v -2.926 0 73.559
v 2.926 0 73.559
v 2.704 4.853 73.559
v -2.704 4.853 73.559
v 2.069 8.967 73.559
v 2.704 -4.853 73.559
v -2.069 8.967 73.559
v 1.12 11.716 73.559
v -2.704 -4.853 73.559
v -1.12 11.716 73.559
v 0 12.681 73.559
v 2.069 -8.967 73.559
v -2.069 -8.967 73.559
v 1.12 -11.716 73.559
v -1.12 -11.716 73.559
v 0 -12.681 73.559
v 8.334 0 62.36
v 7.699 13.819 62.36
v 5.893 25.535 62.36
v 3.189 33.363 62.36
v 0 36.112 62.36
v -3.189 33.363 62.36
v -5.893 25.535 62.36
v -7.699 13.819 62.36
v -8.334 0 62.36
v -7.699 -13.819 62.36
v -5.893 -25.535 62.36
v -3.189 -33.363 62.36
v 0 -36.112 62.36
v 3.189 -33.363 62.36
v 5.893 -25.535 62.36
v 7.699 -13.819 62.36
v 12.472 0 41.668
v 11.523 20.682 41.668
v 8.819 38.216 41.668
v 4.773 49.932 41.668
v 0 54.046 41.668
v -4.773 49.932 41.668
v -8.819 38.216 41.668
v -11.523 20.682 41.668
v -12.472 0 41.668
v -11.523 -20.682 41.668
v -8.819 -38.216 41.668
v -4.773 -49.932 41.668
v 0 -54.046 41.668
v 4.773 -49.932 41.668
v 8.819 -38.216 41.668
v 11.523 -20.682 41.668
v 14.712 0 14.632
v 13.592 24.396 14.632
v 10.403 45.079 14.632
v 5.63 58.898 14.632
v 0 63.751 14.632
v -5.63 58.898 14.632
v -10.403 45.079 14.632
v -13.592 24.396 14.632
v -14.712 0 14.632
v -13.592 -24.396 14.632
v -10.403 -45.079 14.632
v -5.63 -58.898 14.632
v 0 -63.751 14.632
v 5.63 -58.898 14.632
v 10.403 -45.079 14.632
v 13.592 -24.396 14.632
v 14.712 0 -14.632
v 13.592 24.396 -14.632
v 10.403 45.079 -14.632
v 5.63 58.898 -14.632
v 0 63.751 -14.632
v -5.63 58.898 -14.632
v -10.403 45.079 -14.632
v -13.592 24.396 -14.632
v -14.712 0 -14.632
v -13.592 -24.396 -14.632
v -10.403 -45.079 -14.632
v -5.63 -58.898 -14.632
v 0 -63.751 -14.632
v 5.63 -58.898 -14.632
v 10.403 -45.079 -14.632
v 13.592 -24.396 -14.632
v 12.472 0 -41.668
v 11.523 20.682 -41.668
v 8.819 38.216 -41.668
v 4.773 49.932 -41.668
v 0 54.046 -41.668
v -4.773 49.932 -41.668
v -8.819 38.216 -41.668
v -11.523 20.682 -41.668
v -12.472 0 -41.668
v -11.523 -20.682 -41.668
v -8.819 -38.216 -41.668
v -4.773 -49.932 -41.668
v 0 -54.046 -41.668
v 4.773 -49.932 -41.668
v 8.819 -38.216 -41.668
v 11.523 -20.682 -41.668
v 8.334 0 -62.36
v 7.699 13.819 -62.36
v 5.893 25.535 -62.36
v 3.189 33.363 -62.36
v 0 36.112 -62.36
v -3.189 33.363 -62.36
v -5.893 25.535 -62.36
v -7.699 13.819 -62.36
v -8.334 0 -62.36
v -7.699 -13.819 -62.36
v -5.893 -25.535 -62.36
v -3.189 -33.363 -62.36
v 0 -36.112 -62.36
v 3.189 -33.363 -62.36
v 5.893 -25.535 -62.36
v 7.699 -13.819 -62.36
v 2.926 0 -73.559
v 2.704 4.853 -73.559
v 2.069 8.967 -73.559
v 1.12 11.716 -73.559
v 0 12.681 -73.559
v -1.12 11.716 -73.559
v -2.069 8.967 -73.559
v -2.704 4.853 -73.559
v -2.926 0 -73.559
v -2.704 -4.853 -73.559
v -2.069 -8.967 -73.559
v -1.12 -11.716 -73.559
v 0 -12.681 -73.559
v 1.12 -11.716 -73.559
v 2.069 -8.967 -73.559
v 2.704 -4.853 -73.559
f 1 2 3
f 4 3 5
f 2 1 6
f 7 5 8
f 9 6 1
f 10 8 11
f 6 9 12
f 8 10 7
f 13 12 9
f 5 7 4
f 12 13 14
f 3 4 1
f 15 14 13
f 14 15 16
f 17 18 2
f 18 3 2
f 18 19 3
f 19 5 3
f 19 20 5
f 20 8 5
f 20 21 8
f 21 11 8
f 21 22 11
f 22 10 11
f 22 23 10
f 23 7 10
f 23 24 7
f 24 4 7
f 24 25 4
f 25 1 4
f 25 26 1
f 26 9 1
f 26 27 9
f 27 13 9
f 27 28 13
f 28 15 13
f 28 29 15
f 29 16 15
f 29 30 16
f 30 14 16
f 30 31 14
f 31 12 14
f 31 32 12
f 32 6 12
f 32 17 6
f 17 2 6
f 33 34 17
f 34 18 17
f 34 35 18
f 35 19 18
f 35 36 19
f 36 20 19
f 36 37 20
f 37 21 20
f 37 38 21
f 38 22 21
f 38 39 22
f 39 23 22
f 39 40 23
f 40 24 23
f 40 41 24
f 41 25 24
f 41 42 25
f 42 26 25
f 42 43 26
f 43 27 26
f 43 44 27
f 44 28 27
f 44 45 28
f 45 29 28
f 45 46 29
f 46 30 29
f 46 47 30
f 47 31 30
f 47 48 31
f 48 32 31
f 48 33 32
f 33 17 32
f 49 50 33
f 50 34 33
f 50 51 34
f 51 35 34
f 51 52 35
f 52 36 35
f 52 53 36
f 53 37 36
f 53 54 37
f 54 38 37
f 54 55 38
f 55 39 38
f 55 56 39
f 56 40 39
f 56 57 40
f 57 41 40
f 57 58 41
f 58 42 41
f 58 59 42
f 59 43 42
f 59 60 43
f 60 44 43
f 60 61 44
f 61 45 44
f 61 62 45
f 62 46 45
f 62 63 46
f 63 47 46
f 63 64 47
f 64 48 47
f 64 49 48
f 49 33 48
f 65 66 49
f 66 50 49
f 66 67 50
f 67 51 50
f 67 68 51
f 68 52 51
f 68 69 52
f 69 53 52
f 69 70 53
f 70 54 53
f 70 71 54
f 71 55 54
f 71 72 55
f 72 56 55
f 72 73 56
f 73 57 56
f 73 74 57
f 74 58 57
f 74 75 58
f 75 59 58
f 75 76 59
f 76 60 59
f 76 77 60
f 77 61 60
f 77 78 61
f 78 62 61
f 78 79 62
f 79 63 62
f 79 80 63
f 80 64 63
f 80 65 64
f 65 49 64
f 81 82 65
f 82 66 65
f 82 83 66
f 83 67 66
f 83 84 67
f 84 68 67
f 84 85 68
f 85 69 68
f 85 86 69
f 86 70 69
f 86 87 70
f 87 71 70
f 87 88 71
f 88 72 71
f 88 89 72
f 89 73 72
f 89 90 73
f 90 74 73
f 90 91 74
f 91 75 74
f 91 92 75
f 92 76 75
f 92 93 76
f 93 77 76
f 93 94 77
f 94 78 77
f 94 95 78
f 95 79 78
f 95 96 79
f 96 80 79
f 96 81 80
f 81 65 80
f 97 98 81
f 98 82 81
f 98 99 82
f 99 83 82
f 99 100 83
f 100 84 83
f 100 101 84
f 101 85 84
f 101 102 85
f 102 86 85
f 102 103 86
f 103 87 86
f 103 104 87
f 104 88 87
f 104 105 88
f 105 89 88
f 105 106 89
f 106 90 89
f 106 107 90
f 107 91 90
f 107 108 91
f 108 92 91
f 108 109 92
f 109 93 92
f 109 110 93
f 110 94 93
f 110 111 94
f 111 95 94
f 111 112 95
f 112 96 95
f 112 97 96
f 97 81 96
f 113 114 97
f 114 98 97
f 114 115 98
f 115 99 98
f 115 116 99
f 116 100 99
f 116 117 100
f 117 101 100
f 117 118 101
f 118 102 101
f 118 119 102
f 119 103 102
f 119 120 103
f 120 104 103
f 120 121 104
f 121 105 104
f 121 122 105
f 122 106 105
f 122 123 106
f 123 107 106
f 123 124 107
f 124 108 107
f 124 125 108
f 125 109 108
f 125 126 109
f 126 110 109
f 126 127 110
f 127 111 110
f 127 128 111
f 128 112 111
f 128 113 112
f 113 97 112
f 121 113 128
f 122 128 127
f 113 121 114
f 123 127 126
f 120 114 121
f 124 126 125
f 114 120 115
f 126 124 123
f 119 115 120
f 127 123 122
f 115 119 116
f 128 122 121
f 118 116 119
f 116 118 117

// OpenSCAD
// Generated by SolidPython 1.0.1 on 2020-07-29 00:46:45


scale(v = [3, 13, 15]) {
	sphere(r = 5);
}
/***********************************************
*********      SolidPython code:      **********
************************************************
 
# import packages: SolidPython
from solid import *
from solid.utils import *
from itertools import chain, combinations, permutations


class Resize:

    def __init__(self, scad_file):
        self.scad_file = scad_file
        #self.scad_file = import_scad(scad_file)
        # cone/cylinder param:
        self.r1 = 0
        self.r2 = 0
        self.h = 0
        # rectangular prism param:
        self.w = 0
        self.l = 0
        # ellipse param:
        self.r = 0

    # import OpenScad code (file name corresponds to shape)


    # classify shape + parameters
    def assign(self, param1, param2, param3):
        if self.scad_file == 'cone.scad':
            self.r1 = param1
            self.r2 = param2
            self.h = param3
        elif self.scad_file == 'cylinder.scad':
            self.r1 = param1
            self.r2 = param2
            self.h = param3
        elif self.scad_file == 'rectangularPrism.scad':
            self.h = param1
            self.l = param2
            self.w = param3
        else:
            self.r = param1
            self.h = param2

    # resize parameters
    def iterate(self):
        x = range(3, 20, 2)
        i = 1
        if self.scad_file == 'cone.scad':
            tempList = list(permutations(x, 2))
            for temp in tempList:
                param1 = temp[0]
                param2 = temp[1]
                filepath = 'produced_scad_files/' + 'cone' + str(param1) + '_' + str(param2) + '_' + '.scad'
                scad_render_to_file(cylinder(h=param1, r1=param2, r2=0), filepath)

        elif self.scad_file == 'cylinder.scad':
            tempList = list(permutations(x, 3))
            for temp in tempList:
                param1 = temp[0]
                param2 = temp[1]
                filepath = 'produced_scad_files/' + 'cylinder' + str(param1) + '_' + str(param2) + '_' + '.scad'
                scad_render_to_file(cylinder(h=param1, r1=param2, r2=param2), filepath)

        elif self.scad_file == 'rectangularPrism.scad':
            tempList = list(permutations(x, 3))
            for temp in tempList:
                param1 = temp[0]
                param2 = temp[1]
                param3 = temp[2]
                filepath = 'produced_scad_files/' + 'rectangularPrism' + str(param1) + '_' + str(param2) + '_' + str(
                    param3) + '.scad'
                scad_render_to_file(cube(size=(param1, param2, param3)), filepath)

        elif self.scad_file == 'ellipse.scad':
            tempList = list(permutations(x, 4))
            for temp in tempList:
                param1 = temp[0]
                param2 = temp[1]
                param3 = temp[2]
                param4 = temp[3]
                filepath = 'produced_scad_files/' + 'ellipse' + str(param1) + '_' + str(param2) + '_' + str(param3) + '_' + str(param4) + '.scad'
                scad_render_to_file(scale([param1, param2, param3])(sphere(r=param4)), filepath)

    def render_to_scadfile(self):
        scad_render_to_file(scad, 'example.scad') 
 
************************************************/
